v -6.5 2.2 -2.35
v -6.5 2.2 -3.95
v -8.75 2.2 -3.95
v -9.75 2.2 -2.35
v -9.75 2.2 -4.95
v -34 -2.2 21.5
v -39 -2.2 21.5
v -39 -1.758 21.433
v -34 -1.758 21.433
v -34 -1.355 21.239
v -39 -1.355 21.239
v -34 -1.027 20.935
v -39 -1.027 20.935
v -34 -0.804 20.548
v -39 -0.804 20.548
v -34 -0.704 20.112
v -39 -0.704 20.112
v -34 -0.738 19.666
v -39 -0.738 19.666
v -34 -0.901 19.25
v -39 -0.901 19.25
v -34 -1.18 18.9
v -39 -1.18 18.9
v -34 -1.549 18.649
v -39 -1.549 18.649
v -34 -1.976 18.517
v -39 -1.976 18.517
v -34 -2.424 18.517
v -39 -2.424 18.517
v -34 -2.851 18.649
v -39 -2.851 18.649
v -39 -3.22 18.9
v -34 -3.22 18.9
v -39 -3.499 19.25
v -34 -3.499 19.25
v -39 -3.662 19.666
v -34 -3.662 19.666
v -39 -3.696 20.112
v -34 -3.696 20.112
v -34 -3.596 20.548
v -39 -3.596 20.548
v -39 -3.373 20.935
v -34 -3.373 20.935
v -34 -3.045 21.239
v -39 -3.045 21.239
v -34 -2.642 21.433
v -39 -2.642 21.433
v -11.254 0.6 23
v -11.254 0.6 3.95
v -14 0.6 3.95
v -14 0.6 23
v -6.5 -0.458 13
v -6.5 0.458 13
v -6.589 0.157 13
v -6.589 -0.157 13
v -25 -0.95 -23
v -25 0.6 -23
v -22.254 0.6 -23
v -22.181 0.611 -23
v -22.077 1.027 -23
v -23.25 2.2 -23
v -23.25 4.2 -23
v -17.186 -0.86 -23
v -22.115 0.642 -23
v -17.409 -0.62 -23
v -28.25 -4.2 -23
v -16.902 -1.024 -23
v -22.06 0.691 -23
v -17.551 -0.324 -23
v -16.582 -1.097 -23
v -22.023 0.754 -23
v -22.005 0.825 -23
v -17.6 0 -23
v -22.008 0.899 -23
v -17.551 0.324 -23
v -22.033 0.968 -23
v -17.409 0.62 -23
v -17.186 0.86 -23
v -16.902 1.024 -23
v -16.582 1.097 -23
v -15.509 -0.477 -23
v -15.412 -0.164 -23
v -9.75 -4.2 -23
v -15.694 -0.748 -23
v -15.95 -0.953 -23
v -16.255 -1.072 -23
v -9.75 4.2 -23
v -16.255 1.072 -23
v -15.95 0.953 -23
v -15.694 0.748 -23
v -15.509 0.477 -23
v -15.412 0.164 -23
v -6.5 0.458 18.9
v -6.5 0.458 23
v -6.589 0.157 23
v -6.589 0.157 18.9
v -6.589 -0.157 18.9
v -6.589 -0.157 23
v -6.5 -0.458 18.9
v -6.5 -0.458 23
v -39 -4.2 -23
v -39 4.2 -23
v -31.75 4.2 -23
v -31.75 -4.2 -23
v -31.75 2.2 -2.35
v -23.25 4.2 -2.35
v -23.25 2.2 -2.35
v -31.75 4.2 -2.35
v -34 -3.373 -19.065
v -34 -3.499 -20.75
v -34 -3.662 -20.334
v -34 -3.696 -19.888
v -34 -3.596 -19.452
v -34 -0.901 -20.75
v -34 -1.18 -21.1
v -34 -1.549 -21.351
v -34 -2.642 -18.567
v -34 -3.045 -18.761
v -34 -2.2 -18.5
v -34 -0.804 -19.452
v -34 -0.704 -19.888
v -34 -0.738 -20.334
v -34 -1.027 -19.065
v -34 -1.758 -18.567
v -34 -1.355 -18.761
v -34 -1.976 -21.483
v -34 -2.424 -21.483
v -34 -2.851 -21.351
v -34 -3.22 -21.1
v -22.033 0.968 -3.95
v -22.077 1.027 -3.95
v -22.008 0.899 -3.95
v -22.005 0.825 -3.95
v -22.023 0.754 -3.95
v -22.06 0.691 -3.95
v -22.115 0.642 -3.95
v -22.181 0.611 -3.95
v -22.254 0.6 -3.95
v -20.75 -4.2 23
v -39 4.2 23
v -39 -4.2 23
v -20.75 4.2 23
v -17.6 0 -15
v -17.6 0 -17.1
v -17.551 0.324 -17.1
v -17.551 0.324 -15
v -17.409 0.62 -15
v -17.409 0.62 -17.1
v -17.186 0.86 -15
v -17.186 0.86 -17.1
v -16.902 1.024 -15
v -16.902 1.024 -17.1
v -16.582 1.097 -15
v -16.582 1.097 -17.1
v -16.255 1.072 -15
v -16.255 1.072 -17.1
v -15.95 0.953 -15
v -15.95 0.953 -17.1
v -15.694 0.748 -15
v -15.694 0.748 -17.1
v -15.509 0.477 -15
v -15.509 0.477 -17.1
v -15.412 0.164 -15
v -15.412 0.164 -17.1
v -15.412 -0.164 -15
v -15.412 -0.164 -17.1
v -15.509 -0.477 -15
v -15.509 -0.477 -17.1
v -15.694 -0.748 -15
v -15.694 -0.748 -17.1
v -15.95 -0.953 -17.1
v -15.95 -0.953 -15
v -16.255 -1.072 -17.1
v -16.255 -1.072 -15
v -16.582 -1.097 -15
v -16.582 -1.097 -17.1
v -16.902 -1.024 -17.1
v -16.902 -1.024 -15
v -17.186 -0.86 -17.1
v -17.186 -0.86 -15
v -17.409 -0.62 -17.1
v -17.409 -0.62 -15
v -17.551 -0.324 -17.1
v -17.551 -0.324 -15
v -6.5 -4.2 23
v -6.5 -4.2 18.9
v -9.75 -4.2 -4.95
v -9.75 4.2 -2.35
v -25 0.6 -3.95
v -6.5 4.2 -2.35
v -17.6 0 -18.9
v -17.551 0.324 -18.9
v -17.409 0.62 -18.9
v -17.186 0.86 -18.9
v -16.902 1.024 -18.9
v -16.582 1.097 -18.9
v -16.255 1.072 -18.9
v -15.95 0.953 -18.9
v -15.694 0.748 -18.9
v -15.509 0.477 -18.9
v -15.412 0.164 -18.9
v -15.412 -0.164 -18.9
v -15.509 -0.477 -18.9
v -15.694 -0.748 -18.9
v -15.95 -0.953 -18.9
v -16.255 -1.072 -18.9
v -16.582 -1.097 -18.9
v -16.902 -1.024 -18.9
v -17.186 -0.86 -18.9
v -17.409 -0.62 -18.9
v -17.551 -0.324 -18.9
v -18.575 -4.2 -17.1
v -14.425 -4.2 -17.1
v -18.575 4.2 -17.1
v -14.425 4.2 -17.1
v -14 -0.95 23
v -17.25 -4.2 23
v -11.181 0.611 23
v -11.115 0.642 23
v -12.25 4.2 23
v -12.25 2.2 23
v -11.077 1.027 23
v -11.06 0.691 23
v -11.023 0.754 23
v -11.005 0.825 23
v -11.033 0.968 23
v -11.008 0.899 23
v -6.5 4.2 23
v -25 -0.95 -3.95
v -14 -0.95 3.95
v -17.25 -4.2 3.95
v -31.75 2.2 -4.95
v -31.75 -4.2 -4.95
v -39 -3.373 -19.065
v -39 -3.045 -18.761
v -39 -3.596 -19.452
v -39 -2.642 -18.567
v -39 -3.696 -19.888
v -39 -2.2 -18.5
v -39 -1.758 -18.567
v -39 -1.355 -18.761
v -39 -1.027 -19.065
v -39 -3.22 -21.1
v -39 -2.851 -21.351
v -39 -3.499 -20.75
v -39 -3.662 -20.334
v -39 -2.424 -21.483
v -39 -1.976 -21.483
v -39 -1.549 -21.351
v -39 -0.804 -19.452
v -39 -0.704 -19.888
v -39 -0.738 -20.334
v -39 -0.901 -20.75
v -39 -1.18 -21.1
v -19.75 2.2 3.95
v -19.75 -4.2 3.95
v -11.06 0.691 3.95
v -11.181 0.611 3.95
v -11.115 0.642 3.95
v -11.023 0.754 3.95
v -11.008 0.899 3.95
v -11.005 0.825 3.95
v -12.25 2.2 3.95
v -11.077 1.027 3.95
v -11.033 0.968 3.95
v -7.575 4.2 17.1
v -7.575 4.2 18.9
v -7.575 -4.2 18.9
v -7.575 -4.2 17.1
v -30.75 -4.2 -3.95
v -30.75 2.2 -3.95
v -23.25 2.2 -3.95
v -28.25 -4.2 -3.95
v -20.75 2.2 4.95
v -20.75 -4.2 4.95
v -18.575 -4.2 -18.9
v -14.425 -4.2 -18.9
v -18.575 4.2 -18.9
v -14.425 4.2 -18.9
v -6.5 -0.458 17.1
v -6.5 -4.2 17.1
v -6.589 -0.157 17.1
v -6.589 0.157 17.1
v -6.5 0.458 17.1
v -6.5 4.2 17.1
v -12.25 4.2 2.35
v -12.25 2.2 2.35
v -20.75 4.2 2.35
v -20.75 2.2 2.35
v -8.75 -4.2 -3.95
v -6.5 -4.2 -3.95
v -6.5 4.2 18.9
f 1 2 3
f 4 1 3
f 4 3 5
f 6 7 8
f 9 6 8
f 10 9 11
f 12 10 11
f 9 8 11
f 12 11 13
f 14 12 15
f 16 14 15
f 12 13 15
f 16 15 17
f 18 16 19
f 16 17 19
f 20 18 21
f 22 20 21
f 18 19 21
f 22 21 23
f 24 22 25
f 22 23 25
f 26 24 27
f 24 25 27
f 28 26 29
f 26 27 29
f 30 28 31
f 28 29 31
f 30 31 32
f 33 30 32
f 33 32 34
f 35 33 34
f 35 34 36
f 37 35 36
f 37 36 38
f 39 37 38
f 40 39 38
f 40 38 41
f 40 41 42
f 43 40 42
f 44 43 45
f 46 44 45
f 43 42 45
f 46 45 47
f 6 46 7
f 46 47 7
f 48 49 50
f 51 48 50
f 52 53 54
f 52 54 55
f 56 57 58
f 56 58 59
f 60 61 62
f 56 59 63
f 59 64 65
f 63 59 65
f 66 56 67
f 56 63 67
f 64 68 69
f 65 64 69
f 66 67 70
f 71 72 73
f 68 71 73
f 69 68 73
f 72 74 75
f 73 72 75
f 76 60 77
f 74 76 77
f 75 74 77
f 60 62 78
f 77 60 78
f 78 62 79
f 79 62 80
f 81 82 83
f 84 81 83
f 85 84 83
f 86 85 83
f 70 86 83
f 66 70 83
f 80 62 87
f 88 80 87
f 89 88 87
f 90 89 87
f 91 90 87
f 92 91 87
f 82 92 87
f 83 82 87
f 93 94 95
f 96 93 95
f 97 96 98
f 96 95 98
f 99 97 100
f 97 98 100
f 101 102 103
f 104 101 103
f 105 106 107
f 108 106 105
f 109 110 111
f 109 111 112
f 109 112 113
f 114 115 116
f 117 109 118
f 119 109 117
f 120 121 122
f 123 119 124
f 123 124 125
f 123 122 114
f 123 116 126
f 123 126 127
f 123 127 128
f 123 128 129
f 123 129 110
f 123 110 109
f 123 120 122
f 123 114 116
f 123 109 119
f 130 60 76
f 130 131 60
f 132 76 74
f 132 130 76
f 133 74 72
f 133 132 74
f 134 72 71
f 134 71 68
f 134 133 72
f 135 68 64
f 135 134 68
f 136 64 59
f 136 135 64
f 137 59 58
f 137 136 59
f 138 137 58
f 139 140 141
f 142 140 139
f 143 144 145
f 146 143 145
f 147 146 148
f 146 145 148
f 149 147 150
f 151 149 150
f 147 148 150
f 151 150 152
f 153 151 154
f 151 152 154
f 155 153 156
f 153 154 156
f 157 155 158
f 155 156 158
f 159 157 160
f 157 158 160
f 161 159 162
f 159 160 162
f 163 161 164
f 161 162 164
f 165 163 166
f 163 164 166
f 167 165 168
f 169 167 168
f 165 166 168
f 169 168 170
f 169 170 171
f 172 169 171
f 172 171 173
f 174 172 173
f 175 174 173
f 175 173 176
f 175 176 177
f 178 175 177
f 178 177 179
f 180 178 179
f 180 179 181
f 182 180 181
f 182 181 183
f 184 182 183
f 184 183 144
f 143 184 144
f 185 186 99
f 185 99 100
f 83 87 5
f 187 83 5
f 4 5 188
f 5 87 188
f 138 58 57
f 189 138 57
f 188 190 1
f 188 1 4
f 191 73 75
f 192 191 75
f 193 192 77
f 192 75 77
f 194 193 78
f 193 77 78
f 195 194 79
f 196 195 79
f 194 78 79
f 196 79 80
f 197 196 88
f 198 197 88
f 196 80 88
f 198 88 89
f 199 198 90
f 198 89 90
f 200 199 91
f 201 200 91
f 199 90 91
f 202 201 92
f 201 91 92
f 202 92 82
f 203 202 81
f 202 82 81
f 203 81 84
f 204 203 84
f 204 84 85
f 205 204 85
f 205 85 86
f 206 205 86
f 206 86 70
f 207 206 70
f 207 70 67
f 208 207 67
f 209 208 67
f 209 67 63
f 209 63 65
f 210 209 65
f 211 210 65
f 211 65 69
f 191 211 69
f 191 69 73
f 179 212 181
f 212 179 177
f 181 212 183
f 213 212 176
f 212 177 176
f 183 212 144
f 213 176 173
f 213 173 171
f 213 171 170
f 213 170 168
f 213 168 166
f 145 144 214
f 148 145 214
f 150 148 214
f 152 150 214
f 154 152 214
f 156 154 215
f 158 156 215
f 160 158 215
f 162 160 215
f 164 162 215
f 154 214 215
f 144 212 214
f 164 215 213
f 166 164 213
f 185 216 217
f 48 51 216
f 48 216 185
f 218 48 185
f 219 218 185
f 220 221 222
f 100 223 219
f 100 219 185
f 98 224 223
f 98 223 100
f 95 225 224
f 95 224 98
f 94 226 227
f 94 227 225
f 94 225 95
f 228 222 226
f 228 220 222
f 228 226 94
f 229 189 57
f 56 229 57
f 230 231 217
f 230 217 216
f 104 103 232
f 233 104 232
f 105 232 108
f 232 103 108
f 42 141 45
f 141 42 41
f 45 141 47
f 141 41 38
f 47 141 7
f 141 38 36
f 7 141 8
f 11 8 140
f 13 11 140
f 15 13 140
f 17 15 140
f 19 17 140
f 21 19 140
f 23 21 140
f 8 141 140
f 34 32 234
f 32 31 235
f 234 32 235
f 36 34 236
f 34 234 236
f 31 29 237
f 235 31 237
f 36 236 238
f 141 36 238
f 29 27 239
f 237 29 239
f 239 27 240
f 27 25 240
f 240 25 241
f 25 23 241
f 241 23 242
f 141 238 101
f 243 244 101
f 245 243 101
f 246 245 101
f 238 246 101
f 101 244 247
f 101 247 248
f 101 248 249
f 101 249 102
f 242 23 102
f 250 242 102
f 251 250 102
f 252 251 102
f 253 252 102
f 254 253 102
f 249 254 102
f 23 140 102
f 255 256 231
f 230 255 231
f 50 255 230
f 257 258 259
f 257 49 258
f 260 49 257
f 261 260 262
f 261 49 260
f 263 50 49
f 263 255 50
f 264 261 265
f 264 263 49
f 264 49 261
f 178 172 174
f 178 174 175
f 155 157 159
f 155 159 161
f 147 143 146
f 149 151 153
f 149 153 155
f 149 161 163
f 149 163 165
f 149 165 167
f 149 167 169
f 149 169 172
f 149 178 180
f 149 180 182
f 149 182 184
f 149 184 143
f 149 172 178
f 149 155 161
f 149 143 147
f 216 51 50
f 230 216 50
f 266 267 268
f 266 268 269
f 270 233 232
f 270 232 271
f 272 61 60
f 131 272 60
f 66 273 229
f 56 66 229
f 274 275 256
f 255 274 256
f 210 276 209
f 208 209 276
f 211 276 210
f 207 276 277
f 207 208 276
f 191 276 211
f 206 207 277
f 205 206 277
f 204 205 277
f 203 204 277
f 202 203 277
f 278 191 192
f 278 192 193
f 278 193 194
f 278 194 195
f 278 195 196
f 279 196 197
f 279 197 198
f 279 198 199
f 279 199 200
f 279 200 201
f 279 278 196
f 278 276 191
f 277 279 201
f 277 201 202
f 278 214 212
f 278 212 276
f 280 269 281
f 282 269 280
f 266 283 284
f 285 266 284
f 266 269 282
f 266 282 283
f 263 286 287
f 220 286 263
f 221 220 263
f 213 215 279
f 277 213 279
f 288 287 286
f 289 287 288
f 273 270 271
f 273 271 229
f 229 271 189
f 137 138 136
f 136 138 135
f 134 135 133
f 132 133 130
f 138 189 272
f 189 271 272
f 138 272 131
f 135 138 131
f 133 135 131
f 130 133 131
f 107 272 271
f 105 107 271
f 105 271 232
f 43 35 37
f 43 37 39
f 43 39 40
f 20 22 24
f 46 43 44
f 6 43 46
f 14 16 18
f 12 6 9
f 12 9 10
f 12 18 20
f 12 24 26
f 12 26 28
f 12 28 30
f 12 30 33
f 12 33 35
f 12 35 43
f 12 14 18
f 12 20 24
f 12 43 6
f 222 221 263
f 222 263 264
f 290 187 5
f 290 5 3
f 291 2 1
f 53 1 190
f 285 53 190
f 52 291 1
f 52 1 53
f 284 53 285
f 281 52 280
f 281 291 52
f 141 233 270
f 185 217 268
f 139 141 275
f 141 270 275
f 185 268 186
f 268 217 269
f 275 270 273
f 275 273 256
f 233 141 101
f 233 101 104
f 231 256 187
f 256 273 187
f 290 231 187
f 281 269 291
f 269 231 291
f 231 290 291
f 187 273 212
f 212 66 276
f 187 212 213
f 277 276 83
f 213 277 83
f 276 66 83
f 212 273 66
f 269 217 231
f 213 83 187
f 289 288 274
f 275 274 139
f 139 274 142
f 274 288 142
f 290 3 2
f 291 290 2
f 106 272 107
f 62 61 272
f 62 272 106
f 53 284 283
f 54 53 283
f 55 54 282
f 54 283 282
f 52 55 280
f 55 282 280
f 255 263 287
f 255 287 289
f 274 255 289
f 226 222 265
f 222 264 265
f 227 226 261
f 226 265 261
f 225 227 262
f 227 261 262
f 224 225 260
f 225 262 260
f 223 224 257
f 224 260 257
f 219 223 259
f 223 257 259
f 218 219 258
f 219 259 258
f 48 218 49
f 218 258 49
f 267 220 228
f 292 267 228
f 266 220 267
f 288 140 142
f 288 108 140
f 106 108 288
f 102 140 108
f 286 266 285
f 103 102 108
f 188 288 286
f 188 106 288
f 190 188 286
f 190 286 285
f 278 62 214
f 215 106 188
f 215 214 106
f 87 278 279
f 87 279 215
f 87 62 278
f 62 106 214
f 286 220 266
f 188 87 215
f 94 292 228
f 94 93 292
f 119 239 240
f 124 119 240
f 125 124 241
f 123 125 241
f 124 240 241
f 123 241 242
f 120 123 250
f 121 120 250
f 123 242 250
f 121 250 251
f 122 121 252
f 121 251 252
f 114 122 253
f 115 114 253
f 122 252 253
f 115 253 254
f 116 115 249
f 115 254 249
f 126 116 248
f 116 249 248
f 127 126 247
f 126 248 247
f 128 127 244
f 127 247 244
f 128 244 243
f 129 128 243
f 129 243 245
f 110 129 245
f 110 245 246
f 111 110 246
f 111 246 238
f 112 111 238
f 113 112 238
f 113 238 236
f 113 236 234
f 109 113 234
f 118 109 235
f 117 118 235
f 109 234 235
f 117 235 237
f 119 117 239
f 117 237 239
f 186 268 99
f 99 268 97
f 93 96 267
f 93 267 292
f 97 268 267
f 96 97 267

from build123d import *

# Parameters (mm, degrees)
SKETCH1_W               = 78
SKETCH1_H               = 46
BOSS_EXTRUDE1_DEPTH     = 4.2
SKETCH2_W               = 8.5
SKETCH2_H               = 2
CUT_EXTRUDE1_DEPTH      = 20.65
CUT_EXTRUDE2_DEPTH      = 7.4
BOSS_EXTRUDE3_DEPTH     = 23
LPATTERN1_COUNT         = 6
LPATTERN1_PITCH         = 11
MIRROR3_COPY_1_SKETCH_W = 8.5
MIRROR3_COPY_1_SKETCH_H = 2
MIRROR3_COPY_1_DEPTH    = 20.65
MIRROR3_COPY_2_SKETCH_W = 8.5
MIRROR3_COPY_2_SKETCH_H = 2
MIRROR3_COPY_2_DEPTH    = 20.65
MIRROR3_COPY_3_SKETCH_W = 8.5
MIRROR3_COPY_3_SKETCH_H = 2
MIRROR3_COPY_3_DEPTH    = 20.65
MIRROR3_COPY_4_SKETCH_W = 8.5
MIRROR3_COPY_4_SKETCH_H = 2
MIRROR3_COPY_4_DEPTH    = 20.65
MIRROR3_COPY_5_SKETCH_W = 8.5
MIRROR3_COPY_5_SKETCH_H = 2
MIRROR3_COPY_5_DEPTH    = 20.65
MIRROR3_COPY_6_DEPTH    = 7.4
MIRROR3_COPY_7_DEPTH    = 7.4
MIRROR3_COPY_8_DEPTH    = 7.4
MIRROR3_COPY_9_DEPTH    = 7.4
MIRROR3_COPY_10_DEPTH   = 7.4
MIRROR3_COPY_11_DEPTH   = 23
MIRROR3_COPY_12_DEPTH   = 23
MIRROR3_COPY_13_DEPTH   = 23
MIRROR3_COPY_14_DEPTH   = 23
MIRROR3_COPY_15_DEPTH   = 23
SKETCH6_W               = 8.5
SKETCH6_H               = 20.65
BOSS_EXTRUDE2_DEPTH     = 8.4
SKETCH4_R               = 1.5
CUT_EXTRUDE3_DEPTH      = 5
SKETCH7_R               = 1.1
CUT_EXTRUDE4_DEPTH      = 10
SKETCH9_W               = 4.15
SKETCH9_H               = 1.8
CUT_EXTRUDE5_DEPTH      = 9.4
SKETCH10_W              = 4.15
SKETCH10_H              = 1.8
CUT_EXTRUDE6_DEPTH      = 9.4
SKETCH11_R              = 1.1
CUT_EXTRUDE7_DEPTH      = 8
LPATTERN2_COUNT         = 2
LPATTERN2_PITCH         = 22
CUT_EXTRUDE8_DEPTH      = 19.05
CUT_EXTRUDE9_DEPTH      = 19.05
LPATTERN3_COUNT         = 3
LPATTERN3_PITCH         = 22
LPATTERN4_COUNT         = 3
LPATTERN4_PITCH         = 22
FILLET1_R               = 0.25


with BuildPart() as part:
    # Sketch1 → Boss-Extrude1 (new body, symmetric)
    with BuildSketch(Plane(origin=(0, 0, 0), x_dir=(1, 0, 0), z_dir=(0, 1, 0))):
        Rectangle(SKETCH1_W, SKETCH1_H)
    extrude(amount=BOSS_EXTRUDE1_DEPTH, both=True)

    # Sketch2 → Cut-Extrude1 (cut)
    with BuildSketch(Plane(origin=(0, 0, -23), x_dir=(-1, 0, 0), z_dir=(0, 0, -1))):
        with Locations((-27.5, 3.2)):
            Rectangle(SKETCH2_W, SKETCH2_H)
    cut_extrude1 = extrude(amount=-CUT_EXTRUDE1_DEPTH, mode=Mode.SUBTRACT)

    # Sketch3 → Cut-Extrude2 (cut, through all)
    with BuildSketch(Plane(origin=(0, 2.2, 0), x_dir=(1, 0, 0), z_dir=(0, 1, 0))):
        Polygon((24.25, 21.3), (23.25, 20.3), (23.25, 4.95), (24.25, 3.95), (30, 3.95), (30, 21.3), align=None)
        Polygon((30, 23), (23.25, 23), (23.25, 20.3), (24.25, 21.3), (30, 21.3), align=None)
    cut_extrude2 = extrude(amount=-CUT_EXTRUDE2_DEPTH, mode=Mode.SUBTRACT)

    # Sketch15 → Boss-Extrude3 (add)
    with BuildSketch(Plane.XY):
        Polygon((30, -4.2), (26.75, -4.2), (30, -0.95), align=None)
    boss_extrude3 = extrude(amount=-BOSS_EXTRUDE3_DEPTH)

    # LPattern1: Cut-Extrude1, Cut-Extrude2, Boss-Extrude3 ×6
    with Locations(*[(-i * LPATTERN1_PITCH, 0, 0) for i in range(1, LPATTERN1_COUNT)]):
        add(cut_extrude1, mode=Mode.SUBTRACT)
        add(cut_extrude2, mode=Mode.SUBTRACT)
        add(boss_extrude3)

    # Mirror3: Cut-Extrude1, Cut-Extrude2, Boss-Extrude3 across plane
    add(cut_extrude1.mirror(Plane.XY), mode=Mode.SUBTRACT)
    add(cut_extrude2.mirror(Plane.XY), mode=Mode.SUBTRACT)
    add(boss_extrude3.mirror(Plane.XY))

    # Mirror3 copy 1 sketch → Mirror3 copy 1 (cut)
    with BuildSketch(Plane(origin=(-11, 0, 23), x_dir=(-1, 0, 0), z_dir=(0, 0, 1))):
        with Locations((-27.5, -3.2)):
            Rectangle(MIRROR3_COPY_1_SKETCH_W, MIRROR3_COPY_1_SKETCH_H)
    extrude(amount=-MIRROR3_COPY_1_DEPTH, mode=Mode.SUBTRACT)

    # Mirror3 copy 2 sketch → Mirror3 copy 2 (cut)
    with BuildSketch(Plane(origin=(-22, 0, 23), x_dir=(-1, 0, 0), z_dir=(0, 0, 1))):
        with Locations((-27.5, -3.2)):
            Rectangle(MIRROR3_COPY_2_SKETCH_W, MIRROR3_COPY_2_SKETCH_H)
    extrude(amount=-MIRROR3_COPY_2_DEPTH, mode=Mode.SUBTRACT)

    # Mirror3 copy 3 sketch → Mirror3 copy 3 (cut)
    with BuildSketch(Plane(origin=(-33, 0, 23), x_dir=(-1, 0, 0), z_dir=(0, 0, 1))):
        with Locations((-27.5, -3.2)):
            Rectangle(MIRROR3_COPY_3_SKETCH_W, MIRROR3_COPY_3_SKETCH_H)
    extrude(amount=-MIRROR3_COPY_3_DEPTH, mode=Mode.SUBTRACT)

    # Mirror3 copy 4 sketch → Mirror3 copy 4 (cut)
    with BuildSketch(Plane(origin=(-44, 0, 23), x_dir=(-1, 0, 0), z_dir=(0, 0, 1))):
        with Locations((-27.5, -3.2)):
            Rectangle(MIRROR3_COPY_4_SKETCH_W, MIRROR3_COPY_4_SKETCH_H)
    extrude(amount=-MIRROR3_COPY_4_DEPTH, mode=Mode.SUBTRACT)

    # Mirror3 copy 5 sketch → Mirror3 copy 5 (cut)
    with BuildSketch(Plane(origin=(-55, 0, 23), x_dir=(-1, 0, 0), z_dir=(0, 0, 1))):
        with Locations((-27.5, -3.2)):
            Rectangle(MIRROR3_COPY_5_SKETCH_W, MIRROR3_COPY_5_SKETCH_H)
    extrude(amount=-MIRROR3_COPY_5_DEPTH, mode=Mode.SUBTRACT)

    # Mirror3 copy 6 sketch → Mirror3 copy 6 (cut, through all)
    with BuildSketch(Plane(origin=(-11, 2.2, 0), x_dir=(1, 0, 0), z_dir=(0, 1, 0))):
        Polygon((24.25, -21.3), (23.25, -20.3), (23.25, -4.95), (24.25, -3.95), (30, -3.95), (30, -21.3), align=None)
        Polygon((30, -23), (23.25, -23), (23.25, -20.3), (24.25, -21.3), (30, -21.3), align=None)
    extrude(amount=-MIRROR3_COPY_6_DEPTH, mode=Mode.SUBTRACT)

    # Mirror3 copy 7 sketch → Mirror3 copy 7 (cut, through all)
    with BuildSketch(Plane(origin=(-22, 2.2, 0), x_dir=(1, 0, 0), z_dir=(0, 1, 0))):
        Polygon((24.25, -21.3), (23.25, -20.3), (23.25, -4.95), (24.25, -3.95), (30, -3.95), (30, -21.3), align=None)
        Polygon((30, -23), (23.25, -23), (23.25, -20.3), (24.25, -21.3), (30, -21.3), align=None)
    extrude(amount=-MIRROR3_COPY_7_DEPTH, mode=Mode.SUBTRACT)

    # Mirror3 copy 8 sketch → Mirror3 copy 8 (cut, through all)
    with BuildSketch(Plane(origin=(-33, 2.2, 0), x_dir=(1, 0, 0), z_dir=(0, 1, 0))):
        Polygon((24.25, -21.3), (23.25, -20.3), (23.25, -4.95), (24.25, -3.95), (30, -3.95), (30, -21.3), align=None)
        Polygon((30, -23), (23.25, -23), (23.25, -20.3), (24.25, -21.3), (30, -21.3), align=None)
    extrude(amount=-MIRROR3_COPY_8_DEPTH, mode=Mode.SUBTRACT)

    # Mirror3 copy 9 sketch → Mirror3 copy 9 (cut, through all)
    with BuildSketch(Plane(origin=(-44, 2.2, 0), x_dir=(1, 0, 0), z_dir=(0, 1, 0))):
        Polygon((24.25, -21.3), (23.25, -20.3), (23.25, -4.95), (24.25, -3.95), (30, -3.95), (30, -21.3), align=None)
        Polygon((30, -23), (23.25, -23), (23.25, -20.3), (24.25, -21.3), (30, -21.3), align=None)
    extrude(amount=-MIRROR3_COPY_9_DEPTH, mode=Mode.SUBTRACT)

    # Mirror3 copy 10 sketch → Mirror3 copy 10 (cut, through all)
    with BuildSketch(Plane(origin=(-55, 2.2, 0), x_dir=(1, 0, 0), z_dir=(0, 1, 0))):
        Polygon((24.25, -21.3), (23.25, -20.3), (23.25, -4.95), (24.25, -3.95), (30, -3.95), (30, -21.3), align=None)
        Polygon((30, -23), (23.25, -23), (23.25, -20.3), (24.25, -21.3), (30, -21.3), align=None)
    extrude(amount=-MIRROR3_COPY_10_DEPTH, mode=Mode.SUBTRACT)

    # Mirror3 copy 11 sketch → Mirror3 copy 11 (add)
    with BuildSketch(Plane(origin=(-11, 0, 0), x_dir=(1, 0, 0), z_dir=(0, 0, -1))):
        Polygon((30, 4.2), (26.75, 4.2), (30, 0.95), align=None)
    extrude(amount=-MIRROR3_COPY_11_DEPTH)

    # Mirror3 copy 12 sketch → Mirror3 copy 12 (add)
    with BuildSketch(Plane(origin=(-22, 0, 0), x_dir=(1, 0, 0), z_dir=(0, 0, -1))):
        Polygon((30, 4.2), (26.75, 4.2), (30, 0.95), align=None)
    extrude(amount=-MIRROR3_COPY_12_DEPTH)

    # Mirror3 copy 13 sketch → Mirror3 copy 13 (add)
    with BuildSketch(Plane(origin=(-33, 0, 0), x_dir=(1, 0, 0), z_dir=(0, 0, -1))):
        Polygon((30, 4.2), (26.75, 4.2), (30, 0.95), align=None)
    extrude(amount=-MIRROR3_COPY_13_DEPTH)

    # Mirror3 copy 14 sketch → Mirror3 copy 14 (add)
    with BuildSketch(Plane(origin=(-44, 0, 0), x_dir=(1, 0, 0), z_dir=(0, 0, -1))):
        Polygon((30, 4.2), (26.75, 4.2), (30, 0.95), align=None)
    extrude(amount=-MIRROR3_COPY_14_DEPTH)

    # Mirror3 copy 15 sketch → Mirror3 copy 15 (add)
    with BuildSketch(Plane(origin=(-55, 0, 0), x_dir=(1, 0, 0), z_dir=(0, 0, -1))):
        Polygon((30, 4.2), (26.75, 4.2), (30, 0.95), align=None)
    extrude(amount=-MIRROR3_COPY_15_DEPTH)

    # Sketch6 → Boss-Extrude2 (add)
    with BuildSketch(Plane(origin=(0, 4.2, 0), x_dir=(1, 0, 0), z_dir=(0, 1, 0))):
        with Locations((-16.5, 12.675)):
            Rectangle(SKETCH6_W, SKETCH6_H)
        with Locations((5.5, 12.675)):
            Rectangle(SKETCH6_W, SKETCH6_H)
        with Locations((27.5, 12.675)):
            Rectangle(SKETCH6_W, SKETCH6_H)
        with Locations((-27.5, -12.675)):
            Rectangle(SKETCH6_W, SKETCH6_H)
        with Locations((-5.5, -12.675)):
            Rectangle(SKETCH6_W, SKETCH6_H)
        with Locations((16.5, -12.675)):
            Rectangle(SKETCH6_W, SKETCH6_H)
    extrude(amount=-BOSS_EXTRUDE2_DEPTH)

    # Sketch4 → Cut-Extrude3 (cut)
    with BuildSketch(Plane.ZY.offset(39)):
        with Locations((-20, -2.2)):
            Circle(SKETCH4_R)
        with Locations((20, -2.2)):
            Circle(SKETCH4_R)
    cut_extrude3 = extrude(amount=-CUT_EXTRUDE3_DEPTH, mode=Mode.SUBTRACT)

    # Mirror1: Cut-Extrude3 across plane
    add(cut_extrude3.mirror(Plane(origin=(0, 0, 0), x_dir=(0, 0, 1), z_dir=(1, 0, 0))), mode=Mode.SUBTRACT)

    # Sketch7 → Cut-Extrude4 (cut)
    with BuildSketch(Plane.XY.offset(23)):
        with Locations((-5.5, 0)):
            Circle(SKETCH7_R)
        with Locations((16.5, 0)):
            Circle(SKETCH7_R)
    extrude(amount=-CUT_EXTRUDE4_DEPTH, mode=Mode.SUBTRACT)

    # Sketch9 → Cut-Extrude5 (cut, through all)
    with BuildSketch(Plane(origin=(0, 4.2, 0), x_dir=(1, 0, 0), z_dir=(0, 1, 0))):
        with Locations((-5.5, -18)):
            Rectangle(SKETCH9_W, SKETCH9_H)
        Polygon((18.575, -18.9), (14.425, -17.1), (14.425, -18.9), align=None)
        Polygon((18.575, -17.1), (14.425, -17.1), (18.575, -18.9), align=None)
    extrude(amount=-CUT_EXTRUDE5_DEPTH, mode=Mode.SUBTRACT)

    # Sketch10 → Cut-Extrude6 (cut, through all)
    with BuildSketch(Plane(origin=(0, 4.2, 0), x_dir=(1, 0, 0), z_dir=(0, 1, 0))):
        with Locations((-16.5, 18)):
            Rectangle(SKETCH10_W, SKETCH10_H)
    cut_extrude6 = extrude(amount=-CUT_EXTRUDE6_DEPTH, mode=Mode.SUBTRACT)

    # Sketch11 → Cut-Extrude7 (cut)
    with BuildSketch(Plane(origin=(0, 0, -23), x_dir=(-1, 0, 0), z_dir=(0, 0, -1))):
        with Locations((16.5, 0)):
            Circle(SKETCH11_R)
    cut_extrude7 = extrude(amount=-CUT_EXTRUDE7_DEPTH, mode=Mode.SUBTRACT)

    # LPattern2: Cut-Extrude6, Cut-Extrude7 ×2
    with Locations(*[(i * LPATTERN2_PITCH, 0, 0) for i in range(1, LPATTERN2_COUNT)]):
        add(cut_extrude6, mode=Mode.SUBTRACT)
        add(cut_extrude7, mode=Mode.SUBTRACT)

    # Sketch12 → Cut-Extrude8 (cut)
    with BuildSketch(Plane(origin=(0, 0, -23), x_dir=(-1, 0, 0), z_dir=(0, 0, -1))):
        Polygon((-20.75, 2.2), (-22.35, 0.6), (-19, 0.6), (-19, 2.2), align=None)
    cut_extrude8 = extrude(amount=-CUT_EXTRUDE8_DEPTH, mode=Mode.SUBTRACT)

    # Sketch13 → Cut-Extrude9 (cut)
    with BuildSketch(Plane.XY.offset(23)):
        Polygon((31.75, 2.2), (33.35, 0.6), (30, 0.6), (30, 2.2), align=None)
    cut_extrude9 = extrude(amount=-CUT_EXTRUDE9_DEPTH, mode=Mode.SUBTRACT)

    # LPattern3: Cut-Extrude8 ×3
    with Locations(*[(-i * LPATTERN3_PITCH, 0, 0) for i in range(1, LPATTERN3_COUNT)]):
        add(cut_extrude8, mode=Mode.SUBTRACT)

    # LPattern4: Cut-Extrude9 ×3
    with Locations(*[(-i * LPATTERN4_PITCH, 0, 0) for i in range(1, LPATTERN4_COUNT)]):
        add(cut_extrude9, mode=Mode.SUBTRACT)

    # Fillet1
    fillet1_edges = [part.edges().sort_by_distance(p)[0] for p in [
        (22.35, 0.6, -13.475),
        (33.35, 0.6, 13.475),
        (0.35, 0.6, -13.475),
        (-21.65, 0.6, -13.475),
        (11.35, 0.6, 13.475),
        (-10.65, 0.6, 13.475),
    ]]
    fillet(fillet1_edges, radius=FILLET1_R)


with BuildPart() as body_2:
    # Split1: the piece on the far side of the plane
    add(part.part)
    split(bisect_by=Plane(origin=(-6.5, 0, 0), x_dir=(0, 0, 1), z_dir=(1, 0, 0)), keep=Keep.BOTTOM)


with BuildPart() as part_1:
    add(part.part)

    # Split1
    split(bisect_by=Plane(origin=(-6.5, 0, 0), x_dir=(0, 0, 1), z_dir=(1, 0, 0)), keep=Keep.TOP)


solid = body_2.part
